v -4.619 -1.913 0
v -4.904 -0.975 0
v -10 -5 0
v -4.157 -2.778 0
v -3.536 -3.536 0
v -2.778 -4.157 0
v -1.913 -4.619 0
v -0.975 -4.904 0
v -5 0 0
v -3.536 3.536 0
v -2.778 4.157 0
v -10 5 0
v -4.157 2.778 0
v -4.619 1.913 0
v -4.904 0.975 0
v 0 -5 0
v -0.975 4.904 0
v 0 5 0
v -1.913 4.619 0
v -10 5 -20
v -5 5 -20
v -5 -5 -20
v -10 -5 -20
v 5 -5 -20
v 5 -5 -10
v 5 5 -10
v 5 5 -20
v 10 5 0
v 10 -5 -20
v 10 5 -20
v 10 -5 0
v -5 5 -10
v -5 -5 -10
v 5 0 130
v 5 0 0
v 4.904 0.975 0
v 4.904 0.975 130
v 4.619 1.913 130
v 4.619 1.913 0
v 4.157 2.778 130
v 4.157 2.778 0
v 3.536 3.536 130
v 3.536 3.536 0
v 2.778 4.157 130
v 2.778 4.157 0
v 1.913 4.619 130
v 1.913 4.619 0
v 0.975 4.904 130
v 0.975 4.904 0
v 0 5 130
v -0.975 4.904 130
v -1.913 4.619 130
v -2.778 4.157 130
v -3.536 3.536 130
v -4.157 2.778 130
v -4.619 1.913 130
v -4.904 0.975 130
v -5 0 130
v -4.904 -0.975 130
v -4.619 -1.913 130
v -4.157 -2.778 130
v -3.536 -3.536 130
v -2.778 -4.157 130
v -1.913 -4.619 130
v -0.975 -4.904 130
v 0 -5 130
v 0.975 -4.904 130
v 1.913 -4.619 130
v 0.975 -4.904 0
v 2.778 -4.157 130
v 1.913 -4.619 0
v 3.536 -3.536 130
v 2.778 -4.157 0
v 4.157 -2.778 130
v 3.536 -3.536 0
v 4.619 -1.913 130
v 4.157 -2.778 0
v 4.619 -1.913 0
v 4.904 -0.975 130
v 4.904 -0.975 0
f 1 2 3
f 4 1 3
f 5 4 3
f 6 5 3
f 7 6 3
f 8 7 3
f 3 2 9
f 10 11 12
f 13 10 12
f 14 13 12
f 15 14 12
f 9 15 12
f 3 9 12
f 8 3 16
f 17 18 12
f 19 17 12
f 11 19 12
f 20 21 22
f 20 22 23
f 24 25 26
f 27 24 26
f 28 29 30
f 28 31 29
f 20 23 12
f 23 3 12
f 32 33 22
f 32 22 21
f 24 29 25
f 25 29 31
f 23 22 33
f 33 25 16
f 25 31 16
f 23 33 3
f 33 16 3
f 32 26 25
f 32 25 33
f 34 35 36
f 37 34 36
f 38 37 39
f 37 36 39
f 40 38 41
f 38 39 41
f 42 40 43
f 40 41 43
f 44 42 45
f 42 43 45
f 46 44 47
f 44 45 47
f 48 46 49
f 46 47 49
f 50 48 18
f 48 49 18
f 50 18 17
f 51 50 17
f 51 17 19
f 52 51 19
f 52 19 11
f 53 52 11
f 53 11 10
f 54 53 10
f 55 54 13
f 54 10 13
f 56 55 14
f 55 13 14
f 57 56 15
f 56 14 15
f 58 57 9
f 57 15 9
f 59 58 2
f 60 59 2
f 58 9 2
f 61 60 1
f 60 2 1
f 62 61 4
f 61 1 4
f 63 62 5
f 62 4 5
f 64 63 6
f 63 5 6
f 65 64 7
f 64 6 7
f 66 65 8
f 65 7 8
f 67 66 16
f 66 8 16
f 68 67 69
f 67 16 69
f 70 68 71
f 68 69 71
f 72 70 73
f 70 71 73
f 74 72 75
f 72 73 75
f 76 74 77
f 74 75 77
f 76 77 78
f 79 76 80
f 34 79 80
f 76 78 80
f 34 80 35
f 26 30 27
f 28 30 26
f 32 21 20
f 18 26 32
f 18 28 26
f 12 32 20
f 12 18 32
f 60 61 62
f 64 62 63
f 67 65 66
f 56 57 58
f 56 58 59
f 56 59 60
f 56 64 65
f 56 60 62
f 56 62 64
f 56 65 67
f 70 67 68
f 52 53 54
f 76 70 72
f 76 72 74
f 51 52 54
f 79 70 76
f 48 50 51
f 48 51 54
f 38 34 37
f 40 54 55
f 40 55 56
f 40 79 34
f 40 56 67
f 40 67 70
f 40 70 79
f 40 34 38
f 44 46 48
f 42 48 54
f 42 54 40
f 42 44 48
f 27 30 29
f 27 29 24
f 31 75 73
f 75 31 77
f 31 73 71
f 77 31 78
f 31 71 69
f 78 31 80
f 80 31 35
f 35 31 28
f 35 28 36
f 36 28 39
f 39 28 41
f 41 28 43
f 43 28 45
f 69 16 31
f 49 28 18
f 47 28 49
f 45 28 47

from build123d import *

# Parameters (mm, degrees)
SKETCH1_R           = 5
BOSS_EXTRUDE1_DEPTH = 130
SKETCH2_W           = 20
SKETCH2_H           = 10
BOSS_EXTRUDE2_DEPTH = 10
SKETCH3_W           = 5
SKETCH3_H           = 10
BOSS_EXTRUDE3_DEPTH = 10
SKETCH4_W           = 5
SKETCH4_H           = 10
BOSS_EXTRUDE4_DEPTH = 10


with BuildPart() as part:
    # Sketch1 → Boss-Extrude1 (new body)
    with BuildSketch(Plane.XY):
        Circle(SKETCH1_R)
    extrude(amount=BOSS_EXTRUDE1_DEPTH)

    # Sketch2 → Boss-Extrude2 (add)
    with BuildSketch(Plane(origin=(0, 0, 0), x_dir=(-1, 0, 0), z_dir=(0, 0, -1))):
        Rectangle(SKETCH2_W, SKETCH2_H)
    extrude(amount=BOSS_EXTRUDE2_DEPTH)

    # Sketch3 → Boss-Extrude3 (add)
    with BuildSketch(Plane(origin=(0, 0, -10), x_dir=(-1, 0, 0), z_dir=(0, 0, -1))):
        with Locations((-7.5, 0)):
            Rectangle(SKETCH3_W, SKETCH3_H)
    extrude(amount=BOSS_EXTRUDE3_DEPTH)

    # Sketch4 → Boss-Extrude4 (add)
    with BuildSketch(Plane(origin=(0, 0, -10), x_dir=(-1, 0, 0), z_dir=(0, 0, -1))):
        with Locations((7.5, 0)):
            Rectangle(SKETCH4_W, SKETCH4_H)
    extrude(amount=BOSS_EXTRUDE4_DEPTH)


solid = part.part
